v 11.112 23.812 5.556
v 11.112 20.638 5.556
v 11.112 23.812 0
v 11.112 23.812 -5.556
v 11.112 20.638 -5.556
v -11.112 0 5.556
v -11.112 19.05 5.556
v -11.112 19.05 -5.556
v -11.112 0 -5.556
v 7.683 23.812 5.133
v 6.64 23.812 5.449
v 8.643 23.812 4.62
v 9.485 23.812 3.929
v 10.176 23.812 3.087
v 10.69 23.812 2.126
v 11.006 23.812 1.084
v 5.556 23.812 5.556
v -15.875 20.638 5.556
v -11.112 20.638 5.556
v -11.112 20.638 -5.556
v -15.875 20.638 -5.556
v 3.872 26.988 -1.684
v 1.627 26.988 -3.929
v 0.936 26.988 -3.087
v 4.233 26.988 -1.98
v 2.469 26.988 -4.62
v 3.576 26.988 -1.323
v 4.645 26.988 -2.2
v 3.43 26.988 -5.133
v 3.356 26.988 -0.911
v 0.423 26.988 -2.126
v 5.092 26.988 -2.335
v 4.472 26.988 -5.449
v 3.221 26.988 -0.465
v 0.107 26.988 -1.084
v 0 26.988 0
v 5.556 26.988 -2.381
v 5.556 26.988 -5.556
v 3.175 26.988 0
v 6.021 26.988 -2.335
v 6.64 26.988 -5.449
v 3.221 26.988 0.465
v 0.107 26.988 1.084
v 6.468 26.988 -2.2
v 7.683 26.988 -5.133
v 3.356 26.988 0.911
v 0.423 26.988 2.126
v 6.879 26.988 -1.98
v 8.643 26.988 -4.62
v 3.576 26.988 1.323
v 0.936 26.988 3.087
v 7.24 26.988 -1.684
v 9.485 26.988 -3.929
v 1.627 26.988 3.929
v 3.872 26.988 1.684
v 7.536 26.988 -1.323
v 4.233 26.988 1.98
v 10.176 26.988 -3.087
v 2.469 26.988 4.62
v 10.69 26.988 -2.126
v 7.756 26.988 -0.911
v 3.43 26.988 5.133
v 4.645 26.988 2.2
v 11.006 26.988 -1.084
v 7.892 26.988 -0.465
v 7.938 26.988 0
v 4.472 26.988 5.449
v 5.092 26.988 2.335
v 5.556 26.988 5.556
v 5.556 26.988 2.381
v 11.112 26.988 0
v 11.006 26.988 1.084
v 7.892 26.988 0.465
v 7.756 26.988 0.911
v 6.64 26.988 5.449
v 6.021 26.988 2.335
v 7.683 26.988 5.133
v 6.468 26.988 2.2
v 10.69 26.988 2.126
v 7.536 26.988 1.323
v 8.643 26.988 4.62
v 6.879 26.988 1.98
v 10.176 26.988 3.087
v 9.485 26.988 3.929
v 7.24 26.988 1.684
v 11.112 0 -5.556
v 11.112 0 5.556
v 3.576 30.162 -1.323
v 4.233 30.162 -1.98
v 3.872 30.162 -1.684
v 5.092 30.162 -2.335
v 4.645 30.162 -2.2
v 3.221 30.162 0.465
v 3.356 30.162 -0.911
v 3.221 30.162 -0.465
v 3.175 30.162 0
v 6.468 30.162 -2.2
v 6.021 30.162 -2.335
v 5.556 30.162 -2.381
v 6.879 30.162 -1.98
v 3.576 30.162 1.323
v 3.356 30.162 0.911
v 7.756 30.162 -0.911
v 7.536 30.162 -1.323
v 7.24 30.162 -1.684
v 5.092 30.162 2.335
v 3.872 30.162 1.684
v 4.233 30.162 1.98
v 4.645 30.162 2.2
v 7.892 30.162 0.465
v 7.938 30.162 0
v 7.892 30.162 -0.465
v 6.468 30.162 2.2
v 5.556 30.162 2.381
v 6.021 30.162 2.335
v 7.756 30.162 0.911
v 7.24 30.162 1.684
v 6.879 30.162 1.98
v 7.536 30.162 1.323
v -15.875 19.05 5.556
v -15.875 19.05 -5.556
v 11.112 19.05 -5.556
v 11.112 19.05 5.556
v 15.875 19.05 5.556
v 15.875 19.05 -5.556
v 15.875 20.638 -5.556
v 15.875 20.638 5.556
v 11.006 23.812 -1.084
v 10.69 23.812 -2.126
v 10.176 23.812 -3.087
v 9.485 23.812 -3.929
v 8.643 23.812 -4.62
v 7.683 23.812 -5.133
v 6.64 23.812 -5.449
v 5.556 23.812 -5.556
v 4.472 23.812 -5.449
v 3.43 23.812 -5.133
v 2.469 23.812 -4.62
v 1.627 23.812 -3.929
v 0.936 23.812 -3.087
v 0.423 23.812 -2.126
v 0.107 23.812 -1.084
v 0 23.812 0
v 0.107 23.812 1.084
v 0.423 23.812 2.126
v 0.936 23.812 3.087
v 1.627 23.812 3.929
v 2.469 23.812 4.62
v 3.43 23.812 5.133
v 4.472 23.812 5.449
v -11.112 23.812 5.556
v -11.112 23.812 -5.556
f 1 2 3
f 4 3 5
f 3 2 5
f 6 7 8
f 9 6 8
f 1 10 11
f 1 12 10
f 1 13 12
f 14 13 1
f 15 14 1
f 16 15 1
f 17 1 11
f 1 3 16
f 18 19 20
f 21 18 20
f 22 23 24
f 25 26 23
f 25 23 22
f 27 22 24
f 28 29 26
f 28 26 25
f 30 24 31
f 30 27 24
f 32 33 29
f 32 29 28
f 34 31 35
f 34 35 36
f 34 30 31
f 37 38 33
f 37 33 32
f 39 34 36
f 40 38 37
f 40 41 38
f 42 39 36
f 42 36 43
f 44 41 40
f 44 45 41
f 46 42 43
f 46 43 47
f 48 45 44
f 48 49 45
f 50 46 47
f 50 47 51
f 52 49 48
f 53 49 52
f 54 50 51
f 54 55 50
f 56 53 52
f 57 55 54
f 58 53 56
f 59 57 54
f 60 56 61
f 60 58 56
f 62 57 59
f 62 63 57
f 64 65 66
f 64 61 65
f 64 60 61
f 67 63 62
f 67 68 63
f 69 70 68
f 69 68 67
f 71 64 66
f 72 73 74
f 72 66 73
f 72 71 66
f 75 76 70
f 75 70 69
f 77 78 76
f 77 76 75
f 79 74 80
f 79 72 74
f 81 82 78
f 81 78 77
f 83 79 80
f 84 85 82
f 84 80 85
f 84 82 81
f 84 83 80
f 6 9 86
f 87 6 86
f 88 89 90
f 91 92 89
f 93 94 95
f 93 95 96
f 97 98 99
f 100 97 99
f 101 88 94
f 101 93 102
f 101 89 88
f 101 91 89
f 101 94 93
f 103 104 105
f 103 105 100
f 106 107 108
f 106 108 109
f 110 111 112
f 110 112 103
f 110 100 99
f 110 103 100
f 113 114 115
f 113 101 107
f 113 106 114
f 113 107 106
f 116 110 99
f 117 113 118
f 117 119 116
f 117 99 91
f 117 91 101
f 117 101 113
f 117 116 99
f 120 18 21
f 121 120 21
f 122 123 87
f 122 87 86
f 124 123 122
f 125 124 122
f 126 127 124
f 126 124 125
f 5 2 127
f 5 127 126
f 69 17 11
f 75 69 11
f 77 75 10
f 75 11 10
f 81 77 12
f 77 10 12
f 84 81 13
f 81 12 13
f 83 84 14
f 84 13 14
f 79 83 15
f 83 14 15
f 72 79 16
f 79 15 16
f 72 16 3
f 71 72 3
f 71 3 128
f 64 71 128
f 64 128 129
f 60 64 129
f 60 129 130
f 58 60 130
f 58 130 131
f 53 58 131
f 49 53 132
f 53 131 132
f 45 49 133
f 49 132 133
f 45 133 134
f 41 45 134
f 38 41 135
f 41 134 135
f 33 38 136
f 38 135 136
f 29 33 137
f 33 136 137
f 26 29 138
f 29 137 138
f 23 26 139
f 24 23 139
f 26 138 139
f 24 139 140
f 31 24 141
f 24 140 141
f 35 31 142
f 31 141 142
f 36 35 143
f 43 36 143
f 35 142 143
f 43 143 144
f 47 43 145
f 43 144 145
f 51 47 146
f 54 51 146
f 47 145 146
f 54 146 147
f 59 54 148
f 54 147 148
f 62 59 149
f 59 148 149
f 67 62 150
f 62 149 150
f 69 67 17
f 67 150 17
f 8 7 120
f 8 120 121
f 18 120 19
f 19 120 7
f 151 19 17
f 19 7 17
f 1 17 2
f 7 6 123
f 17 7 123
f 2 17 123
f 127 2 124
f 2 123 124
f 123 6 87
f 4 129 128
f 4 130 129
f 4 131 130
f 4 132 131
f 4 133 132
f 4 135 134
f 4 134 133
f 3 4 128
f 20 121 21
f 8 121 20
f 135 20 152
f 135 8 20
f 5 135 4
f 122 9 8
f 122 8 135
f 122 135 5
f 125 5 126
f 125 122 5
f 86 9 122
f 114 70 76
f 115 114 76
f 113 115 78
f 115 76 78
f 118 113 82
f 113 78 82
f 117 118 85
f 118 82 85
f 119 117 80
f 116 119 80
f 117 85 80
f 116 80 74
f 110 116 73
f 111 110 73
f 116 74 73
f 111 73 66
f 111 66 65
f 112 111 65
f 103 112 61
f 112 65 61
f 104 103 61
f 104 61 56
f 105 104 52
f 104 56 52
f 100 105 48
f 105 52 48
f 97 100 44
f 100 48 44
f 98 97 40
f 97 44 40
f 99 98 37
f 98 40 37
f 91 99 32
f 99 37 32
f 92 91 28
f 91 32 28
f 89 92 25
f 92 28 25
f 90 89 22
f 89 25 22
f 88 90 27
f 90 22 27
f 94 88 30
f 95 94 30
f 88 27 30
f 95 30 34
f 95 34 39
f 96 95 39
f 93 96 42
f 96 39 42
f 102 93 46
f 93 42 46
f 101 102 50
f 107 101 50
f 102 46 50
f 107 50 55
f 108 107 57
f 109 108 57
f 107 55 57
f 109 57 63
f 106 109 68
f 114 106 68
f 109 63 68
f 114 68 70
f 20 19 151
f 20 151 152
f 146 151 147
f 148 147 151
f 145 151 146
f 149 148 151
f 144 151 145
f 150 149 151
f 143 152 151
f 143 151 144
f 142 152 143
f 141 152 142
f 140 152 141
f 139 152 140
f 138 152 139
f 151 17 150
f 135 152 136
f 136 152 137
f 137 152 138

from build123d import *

# Parameters (mm, degrees)
SKETCH1_W           = 22.225
SKETCH1_H           = 11.1125
BOSS_EXTRUDE1_DEPTH = 23.8125
SKETCH2_W           = 11.1125
SKETCH2_H           = 1.5875
BOSS_EXTRUDE2_DEPTH = 4.7625
SKETCH3_R           = 5.55625
BOSS_EXTRUDE3_DEPTH = 3.175
SKETCH4_R           = 2.38125
BOSS_EXTRUDE4_DEPTH = 3.175


with BuildPart() as part:
    # Sketch1 → Boss-Extrude1 (new body)
    with BuildSketch(Plane(origin=(0, 0, 0), x_dir=(1, 0, 0), z_dir=(0, 1, 0))):
        Rectangle(SKETCH1_W, SKETCH1_H)
    extrude(amount=BOSS_EXTRUDE1_DEPTH)

    # Sketch2 → Boss-Extrude2 (add)
    with BuildSketch(Plane(origin=(11.1125, 0, 0), x_dir=(0, 0, -1), z_dir=(1, 0, 0))):
        with Locations((0, 19.84375)):
            Rectangle(SKETCH2_W, SKETCH2_H)
    boss_extrude2 = extrude(amount=BOSS_EXTRUDE2_DEPTH)

    # Mirror2: Boss-Extrude2 across plane
    add(boss_extrude2.mirror(Plane.ZY))

    # Sketch3 → Boss-Extrude3 (add)
    with BuildSketch(Plane(origin=(0, 23.8125, 0), x_dir=(1, 0, 0), z_dir=(0, 1, 0))):
        with Locations(Location((5.55625, 0, 0), (0, 0, 270))):
            Circle(SKETCH3_R)
    extrude(amount=BOSS_EXTRUDE3_DEPTH)

    # Sketch4 → Boss-Extrude4 (add)
    with BuildSketch(Plane(origin=(0, 26.9875, 0), x_dir=(1, 0, 0), z_dir=(0, 1, 0))):
        with Locations(Location((5.55625, 0, 0), (0, 0, 270))):
            Circle(SKETCH4_R)
    extrude(amount=BOSS_EXTRUDE4_DEPTH)


solid = part.part
